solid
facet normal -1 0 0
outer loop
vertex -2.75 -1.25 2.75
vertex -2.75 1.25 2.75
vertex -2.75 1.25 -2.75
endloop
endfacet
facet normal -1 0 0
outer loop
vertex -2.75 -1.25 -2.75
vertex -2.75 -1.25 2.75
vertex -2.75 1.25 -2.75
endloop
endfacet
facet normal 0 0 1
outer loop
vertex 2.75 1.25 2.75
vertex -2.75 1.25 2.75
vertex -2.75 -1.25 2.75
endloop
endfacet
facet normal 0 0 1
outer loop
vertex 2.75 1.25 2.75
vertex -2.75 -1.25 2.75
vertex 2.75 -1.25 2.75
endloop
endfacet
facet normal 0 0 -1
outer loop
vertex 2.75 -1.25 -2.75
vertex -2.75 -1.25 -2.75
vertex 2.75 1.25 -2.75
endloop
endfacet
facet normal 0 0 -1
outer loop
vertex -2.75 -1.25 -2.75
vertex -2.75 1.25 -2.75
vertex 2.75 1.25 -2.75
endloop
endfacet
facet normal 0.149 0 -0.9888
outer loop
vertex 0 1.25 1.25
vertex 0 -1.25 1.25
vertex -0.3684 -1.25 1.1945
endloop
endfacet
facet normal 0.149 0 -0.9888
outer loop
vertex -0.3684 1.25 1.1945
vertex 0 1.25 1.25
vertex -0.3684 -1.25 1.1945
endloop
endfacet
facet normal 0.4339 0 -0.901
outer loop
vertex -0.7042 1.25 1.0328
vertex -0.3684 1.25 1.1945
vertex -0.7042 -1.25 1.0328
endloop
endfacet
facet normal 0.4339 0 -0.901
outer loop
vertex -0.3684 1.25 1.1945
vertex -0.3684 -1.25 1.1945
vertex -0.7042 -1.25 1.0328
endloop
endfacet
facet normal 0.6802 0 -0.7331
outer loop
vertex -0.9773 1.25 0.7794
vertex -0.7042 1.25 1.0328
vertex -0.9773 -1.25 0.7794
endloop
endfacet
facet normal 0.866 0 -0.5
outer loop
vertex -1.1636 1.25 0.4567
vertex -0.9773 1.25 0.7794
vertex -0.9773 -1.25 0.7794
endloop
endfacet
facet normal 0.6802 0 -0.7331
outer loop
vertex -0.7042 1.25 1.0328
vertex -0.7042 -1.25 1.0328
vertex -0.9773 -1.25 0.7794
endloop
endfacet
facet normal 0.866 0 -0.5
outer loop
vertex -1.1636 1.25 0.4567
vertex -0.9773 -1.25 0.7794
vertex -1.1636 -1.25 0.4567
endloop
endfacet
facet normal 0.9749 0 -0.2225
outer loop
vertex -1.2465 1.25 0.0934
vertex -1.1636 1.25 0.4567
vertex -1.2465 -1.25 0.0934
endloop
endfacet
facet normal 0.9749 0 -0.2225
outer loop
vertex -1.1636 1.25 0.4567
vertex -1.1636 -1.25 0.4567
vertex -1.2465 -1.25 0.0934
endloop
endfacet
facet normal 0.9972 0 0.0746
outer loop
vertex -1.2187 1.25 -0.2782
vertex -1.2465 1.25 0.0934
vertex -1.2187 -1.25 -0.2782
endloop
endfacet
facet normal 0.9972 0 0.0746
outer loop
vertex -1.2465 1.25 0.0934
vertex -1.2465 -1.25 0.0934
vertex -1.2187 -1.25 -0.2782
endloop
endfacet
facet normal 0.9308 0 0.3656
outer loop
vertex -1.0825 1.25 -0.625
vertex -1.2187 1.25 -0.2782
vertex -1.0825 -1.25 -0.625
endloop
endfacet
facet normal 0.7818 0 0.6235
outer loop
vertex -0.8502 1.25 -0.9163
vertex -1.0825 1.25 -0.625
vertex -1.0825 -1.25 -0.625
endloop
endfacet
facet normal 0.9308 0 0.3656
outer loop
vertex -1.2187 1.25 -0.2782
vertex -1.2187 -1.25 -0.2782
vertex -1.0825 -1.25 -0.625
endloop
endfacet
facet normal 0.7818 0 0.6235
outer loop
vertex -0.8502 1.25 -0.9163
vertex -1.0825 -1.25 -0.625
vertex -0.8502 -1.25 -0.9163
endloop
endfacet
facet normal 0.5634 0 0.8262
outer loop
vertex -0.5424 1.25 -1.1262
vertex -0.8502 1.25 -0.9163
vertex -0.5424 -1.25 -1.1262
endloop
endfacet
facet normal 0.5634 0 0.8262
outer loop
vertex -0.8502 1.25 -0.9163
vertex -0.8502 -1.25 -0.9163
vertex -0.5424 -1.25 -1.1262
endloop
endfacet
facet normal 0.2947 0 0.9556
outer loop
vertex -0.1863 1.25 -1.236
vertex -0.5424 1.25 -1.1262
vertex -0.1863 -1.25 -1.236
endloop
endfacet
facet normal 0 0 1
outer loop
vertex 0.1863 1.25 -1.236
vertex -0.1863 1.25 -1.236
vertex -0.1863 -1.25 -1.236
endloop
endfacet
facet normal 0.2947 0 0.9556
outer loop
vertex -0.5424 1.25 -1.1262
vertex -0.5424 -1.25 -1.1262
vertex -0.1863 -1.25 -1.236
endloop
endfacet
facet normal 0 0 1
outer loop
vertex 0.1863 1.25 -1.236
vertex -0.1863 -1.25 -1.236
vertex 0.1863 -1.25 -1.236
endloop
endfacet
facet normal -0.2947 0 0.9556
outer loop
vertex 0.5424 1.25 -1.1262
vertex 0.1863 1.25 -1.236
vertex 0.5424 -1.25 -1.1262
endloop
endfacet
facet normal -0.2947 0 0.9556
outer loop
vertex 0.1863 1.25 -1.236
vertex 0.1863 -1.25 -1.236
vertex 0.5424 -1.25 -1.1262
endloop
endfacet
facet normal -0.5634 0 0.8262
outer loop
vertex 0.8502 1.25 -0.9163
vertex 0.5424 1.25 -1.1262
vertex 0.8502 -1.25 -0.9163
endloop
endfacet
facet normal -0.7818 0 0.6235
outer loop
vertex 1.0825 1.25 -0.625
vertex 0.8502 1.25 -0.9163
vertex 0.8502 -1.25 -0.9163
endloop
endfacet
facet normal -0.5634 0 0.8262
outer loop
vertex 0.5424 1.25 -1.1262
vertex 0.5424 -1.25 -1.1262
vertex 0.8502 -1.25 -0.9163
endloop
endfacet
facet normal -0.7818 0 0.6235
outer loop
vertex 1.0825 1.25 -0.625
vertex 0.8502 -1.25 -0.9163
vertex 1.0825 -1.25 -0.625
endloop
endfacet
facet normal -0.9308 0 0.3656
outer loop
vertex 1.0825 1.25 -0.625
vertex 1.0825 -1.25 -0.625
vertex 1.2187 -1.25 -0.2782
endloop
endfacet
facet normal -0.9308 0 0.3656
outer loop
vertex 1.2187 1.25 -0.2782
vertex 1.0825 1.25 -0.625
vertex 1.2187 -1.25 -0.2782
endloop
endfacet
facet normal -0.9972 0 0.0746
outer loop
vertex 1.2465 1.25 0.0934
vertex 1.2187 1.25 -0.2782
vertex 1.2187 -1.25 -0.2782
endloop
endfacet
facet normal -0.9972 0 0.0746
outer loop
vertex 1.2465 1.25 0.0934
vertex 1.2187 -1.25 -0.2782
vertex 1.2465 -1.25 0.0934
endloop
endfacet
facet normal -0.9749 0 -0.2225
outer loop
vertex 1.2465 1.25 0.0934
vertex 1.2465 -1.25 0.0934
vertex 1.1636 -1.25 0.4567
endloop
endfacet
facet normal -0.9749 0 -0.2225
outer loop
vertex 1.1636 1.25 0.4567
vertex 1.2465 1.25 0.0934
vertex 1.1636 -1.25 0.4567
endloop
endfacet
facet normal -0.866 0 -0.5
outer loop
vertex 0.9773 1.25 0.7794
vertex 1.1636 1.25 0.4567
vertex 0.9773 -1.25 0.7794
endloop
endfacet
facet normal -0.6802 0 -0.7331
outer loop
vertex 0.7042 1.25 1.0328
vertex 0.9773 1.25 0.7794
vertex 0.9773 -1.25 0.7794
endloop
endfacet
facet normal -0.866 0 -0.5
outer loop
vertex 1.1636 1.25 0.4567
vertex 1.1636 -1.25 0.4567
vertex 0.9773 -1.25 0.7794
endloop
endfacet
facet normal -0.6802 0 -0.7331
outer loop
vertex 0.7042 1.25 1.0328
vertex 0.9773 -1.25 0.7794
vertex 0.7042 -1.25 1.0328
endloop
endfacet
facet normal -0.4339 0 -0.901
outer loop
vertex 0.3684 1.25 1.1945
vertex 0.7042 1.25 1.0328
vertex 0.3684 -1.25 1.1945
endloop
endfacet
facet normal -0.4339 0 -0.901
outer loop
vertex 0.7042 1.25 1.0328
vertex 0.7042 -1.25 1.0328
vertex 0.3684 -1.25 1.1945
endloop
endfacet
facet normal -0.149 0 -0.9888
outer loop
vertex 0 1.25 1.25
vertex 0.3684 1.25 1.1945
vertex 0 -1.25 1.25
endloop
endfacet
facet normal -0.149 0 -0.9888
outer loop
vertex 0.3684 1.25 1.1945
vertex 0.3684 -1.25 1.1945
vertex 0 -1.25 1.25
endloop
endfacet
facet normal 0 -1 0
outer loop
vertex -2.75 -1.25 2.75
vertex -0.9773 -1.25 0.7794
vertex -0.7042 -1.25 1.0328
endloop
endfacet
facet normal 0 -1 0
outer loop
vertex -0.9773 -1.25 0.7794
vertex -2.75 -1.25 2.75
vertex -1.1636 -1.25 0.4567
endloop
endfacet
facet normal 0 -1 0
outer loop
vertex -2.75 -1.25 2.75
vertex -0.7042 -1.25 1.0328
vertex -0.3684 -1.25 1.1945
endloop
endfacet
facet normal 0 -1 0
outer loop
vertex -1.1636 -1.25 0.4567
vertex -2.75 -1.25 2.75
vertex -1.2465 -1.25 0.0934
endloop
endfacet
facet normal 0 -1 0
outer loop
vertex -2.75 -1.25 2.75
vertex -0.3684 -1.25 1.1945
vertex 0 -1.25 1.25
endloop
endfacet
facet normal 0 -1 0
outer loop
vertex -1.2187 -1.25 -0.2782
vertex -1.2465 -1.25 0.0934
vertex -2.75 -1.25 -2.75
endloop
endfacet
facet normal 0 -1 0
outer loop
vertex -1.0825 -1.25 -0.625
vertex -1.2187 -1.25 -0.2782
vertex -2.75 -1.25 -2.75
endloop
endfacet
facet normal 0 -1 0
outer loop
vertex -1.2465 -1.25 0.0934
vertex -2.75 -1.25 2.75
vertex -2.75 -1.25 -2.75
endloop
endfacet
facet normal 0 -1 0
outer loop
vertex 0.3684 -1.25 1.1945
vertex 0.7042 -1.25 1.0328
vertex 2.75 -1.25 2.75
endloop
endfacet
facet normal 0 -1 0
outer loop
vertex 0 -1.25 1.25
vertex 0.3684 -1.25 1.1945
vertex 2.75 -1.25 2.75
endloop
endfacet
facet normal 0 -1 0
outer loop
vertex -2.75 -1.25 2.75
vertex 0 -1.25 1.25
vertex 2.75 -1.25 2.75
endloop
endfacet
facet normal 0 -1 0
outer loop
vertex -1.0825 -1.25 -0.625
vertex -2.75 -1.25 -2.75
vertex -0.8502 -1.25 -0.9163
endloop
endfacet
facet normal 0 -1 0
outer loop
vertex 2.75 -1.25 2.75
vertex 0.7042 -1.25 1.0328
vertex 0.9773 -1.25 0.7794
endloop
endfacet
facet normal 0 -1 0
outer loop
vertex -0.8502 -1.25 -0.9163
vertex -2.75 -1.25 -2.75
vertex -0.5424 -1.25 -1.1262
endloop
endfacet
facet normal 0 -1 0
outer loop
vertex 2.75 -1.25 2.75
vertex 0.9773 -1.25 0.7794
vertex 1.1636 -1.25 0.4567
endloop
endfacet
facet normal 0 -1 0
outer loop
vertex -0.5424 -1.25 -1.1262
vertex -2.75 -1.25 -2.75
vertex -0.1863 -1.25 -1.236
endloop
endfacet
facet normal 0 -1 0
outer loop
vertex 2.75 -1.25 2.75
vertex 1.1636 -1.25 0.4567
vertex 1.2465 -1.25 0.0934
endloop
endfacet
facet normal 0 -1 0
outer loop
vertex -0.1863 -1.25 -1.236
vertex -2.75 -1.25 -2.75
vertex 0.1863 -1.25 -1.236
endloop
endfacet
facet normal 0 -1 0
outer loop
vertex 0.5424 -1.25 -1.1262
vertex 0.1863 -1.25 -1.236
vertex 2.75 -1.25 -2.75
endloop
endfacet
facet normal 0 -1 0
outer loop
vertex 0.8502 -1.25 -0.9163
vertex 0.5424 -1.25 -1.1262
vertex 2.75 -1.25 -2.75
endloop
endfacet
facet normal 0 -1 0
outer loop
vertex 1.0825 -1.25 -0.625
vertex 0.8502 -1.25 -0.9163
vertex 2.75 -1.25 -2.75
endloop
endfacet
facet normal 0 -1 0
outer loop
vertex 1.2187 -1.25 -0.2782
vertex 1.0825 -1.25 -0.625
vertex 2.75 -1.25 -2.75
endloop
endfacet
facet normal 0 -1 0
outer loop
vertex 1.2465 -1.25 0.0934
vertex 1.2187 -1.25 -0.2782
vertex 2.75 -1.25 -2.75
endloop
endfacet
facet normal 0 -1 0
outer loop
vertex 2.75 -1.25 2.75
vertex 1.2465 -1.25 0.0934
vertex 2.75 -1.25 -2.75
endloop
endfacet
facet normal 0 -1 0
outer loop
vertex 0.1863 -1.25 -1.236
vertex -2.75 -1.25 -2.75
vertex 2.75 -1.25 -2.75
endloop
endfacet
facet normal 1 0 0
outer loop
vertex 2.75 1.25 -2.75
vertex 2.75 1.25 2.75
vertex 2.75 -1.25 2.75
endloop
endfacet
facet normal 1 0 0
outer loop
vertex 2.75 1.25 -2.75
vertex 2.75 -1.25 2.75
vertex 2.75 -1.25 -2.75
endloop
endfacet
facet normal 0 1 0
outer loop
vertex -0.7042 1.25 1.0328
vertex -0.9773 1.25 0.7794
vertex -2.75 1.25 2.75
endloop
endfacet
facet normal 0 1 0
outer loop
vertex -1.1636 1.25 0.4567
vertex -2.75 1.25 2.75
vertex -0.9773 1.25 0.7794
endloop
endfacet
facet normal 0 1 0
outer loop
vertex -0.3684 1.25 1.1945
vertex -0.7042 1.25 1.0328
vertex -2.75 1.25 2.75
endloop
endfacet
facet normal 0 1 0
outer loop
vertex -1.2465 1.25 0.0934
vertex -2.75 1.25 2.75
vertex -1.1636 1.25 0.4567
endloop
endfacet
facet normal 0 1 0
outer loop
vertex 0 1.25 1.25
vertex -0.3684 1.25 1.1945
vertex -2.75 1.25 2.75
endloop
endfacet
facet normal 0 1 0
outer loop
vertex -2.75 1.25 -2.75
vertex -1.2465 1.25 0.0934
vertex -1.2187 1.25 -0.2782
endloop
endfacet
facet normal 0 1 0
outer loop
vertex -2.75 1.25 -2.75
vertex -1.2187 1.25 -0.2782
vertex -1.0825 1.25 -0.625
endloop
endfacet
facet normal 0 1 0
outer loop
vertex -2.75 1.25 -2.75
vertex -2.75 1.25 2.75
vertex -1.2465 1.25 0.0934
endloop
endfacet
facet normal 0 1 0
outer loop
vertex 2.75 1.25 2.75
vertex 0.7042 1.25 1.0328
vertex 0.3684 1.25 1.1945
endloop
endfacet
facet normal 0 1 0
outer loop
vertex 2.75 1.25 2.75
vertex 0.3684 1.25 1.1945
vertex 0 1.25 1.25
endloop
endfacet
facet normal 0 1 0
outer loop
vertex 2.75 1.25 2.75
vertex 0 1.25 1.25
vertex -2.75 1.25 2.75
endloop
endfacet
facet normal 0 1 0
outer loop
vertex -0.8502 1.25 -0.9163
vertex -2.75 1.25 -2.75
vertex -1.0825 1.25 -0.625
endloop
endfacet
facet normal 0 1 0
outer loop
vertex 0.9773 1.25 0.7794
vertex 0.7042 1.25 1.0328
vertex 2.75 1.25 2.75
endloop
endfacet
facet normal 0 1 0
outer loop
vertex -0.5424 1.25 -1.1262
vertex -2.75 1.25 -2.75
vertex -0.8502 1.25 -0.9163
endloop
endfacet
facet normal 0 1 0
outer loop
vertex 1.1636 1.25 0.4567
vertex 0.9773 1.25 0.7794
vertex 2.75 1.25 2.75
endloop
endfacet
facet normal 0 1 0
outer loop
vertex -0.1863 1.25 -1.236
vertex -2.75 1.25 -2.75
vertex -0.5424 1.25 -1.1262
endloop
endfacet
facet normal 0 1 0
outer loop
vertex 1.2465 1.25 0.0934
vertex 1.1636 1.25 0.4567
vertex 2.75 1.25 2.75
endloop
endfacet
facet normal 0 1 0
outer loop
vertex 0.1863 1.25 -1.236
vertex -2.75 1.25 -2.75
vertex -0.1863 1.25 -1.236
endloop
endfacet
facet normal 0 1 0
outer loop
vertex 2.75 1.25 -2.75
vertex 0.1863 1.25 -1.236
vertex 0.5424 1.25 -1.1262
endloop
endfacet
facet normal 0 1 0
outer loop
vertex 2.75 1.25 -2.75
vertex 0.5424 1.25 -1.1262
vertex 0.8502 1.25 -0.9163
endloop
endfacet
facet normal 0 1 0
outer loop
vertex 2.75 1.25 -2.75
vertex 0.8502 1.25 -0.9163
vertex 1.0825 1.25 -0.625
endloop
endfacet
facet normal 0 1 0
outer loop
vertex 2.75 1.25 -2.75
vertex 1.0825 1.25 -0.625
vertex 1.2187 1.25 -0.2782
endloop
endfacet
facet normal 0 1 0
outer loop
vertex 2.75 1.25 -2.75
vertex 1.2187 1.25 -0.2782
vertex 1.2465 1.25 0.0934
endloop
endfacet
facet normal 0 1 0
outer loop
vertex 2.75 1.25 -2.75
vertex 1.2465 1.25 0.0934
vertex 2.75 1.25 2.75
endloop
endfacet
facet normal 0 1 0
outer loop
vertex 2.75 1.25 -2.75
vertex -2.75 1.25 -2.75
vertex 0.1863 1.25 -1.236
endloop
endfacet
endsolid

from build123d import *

# Parameters (mm, degrees)
SKETCH1_W           = 5.5
SKETCH1_H           = 5.5
BOSS_EXTRUDE1_DEPTH = 1.25
SKETCH4_W           = 1.25
SKETCH4_H           = 2.501


with BuildPart() as part:
    # Sketch1 → Boss-Extrude1 (new body, symmetric)
    with BuildSketch(Plane(origin=(0, 0, 0), x_dir=(1, 0, 0), z_dir=(0, 1, 0))):
        Rectangle(SKETCH1_W, SKETCH1_H)
    extrude(amount=BOSS_EXTRUDE1_DEPTH, both=True)

    # Sketch4 → Tap Drill for M3x0.5 Tap1 (revolve, cut)
    with BuildSketch(Plane(origin=(0, 1.25, 0), x_dir=(0, 0, 1), z_dir=(1, 0, 0))):
        with Locations((0.625, 1.2505)):
            Rectangle(SKETCH4_W, SKETCH4_H)
    revolve(axis=Axis((0, 7.6, 0), (0, -1, 0)), mode=Mode.SUBTRACT)


solid = part.part
